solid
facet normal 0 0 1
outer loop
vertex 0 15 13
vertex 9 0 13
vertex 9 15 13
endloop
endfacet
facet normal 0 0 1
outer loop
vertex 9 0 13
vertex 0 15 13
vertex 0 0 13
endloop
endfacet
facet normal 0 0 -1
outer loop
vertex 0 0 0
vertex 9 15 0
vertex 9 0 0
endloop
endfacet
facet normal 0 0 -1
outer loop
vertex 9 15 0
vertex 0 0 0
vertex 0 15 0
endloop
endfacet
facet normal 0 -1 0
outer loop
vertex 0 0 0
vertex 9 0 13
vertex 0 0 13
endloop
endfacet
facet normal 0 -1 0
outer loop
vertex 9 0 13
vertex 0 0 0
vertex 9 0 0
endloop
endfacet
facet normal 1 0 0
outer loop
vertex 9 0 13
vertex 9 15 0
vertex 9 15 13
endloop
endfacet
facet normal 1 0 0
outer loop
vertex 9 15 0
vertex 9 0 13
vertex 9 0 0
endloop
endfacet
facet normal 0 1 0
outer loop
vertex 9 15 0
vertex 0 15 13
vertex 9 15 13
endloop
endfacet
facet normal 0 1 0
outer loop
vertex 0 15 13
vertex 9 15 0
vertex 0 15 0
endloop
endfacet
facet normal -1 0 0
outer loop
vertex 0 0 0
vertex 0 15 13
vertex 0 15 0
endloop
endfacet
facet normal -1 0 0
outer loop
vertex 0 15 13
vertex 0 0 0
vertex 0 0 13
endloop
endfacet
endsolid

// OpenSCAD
// Generated by SolidPython 1.0.1 on 2020-07-29 00:46:55


cube(size = [9, 15, 13]);
/***********************************************
*********      SolidPython code:      **********
************************************************
 
# import packages: SolidPython
from solid import *
from solid.utils import *
from itertools import chain, combinations, permutations


class Resize:

    def __init__(self, scad_file):
        self.scad_file = scad_file
        #self.scad_file = import_scad(scad_file)
        # cone/cylinder param:
        self.r1 = 0
        self.r2 = 0
        self.h = 0
        # rectangular prism param:
        self.w = 0
        self.l = 0
        # ellipse param:
        self.r = 0

    # import OpenScad code (file name corresponds to shape)


    # classify shape + parameters
    def assign(self, param1, param2, param3):
        if self.scad_file == 'cone.scad':
            self.r1 = param1
            self.r2 = param2
            self.h = param3
        elif self.scad_file == 'cylinder.scad':
            self.r1 = param1
            self.r2 = param2
            self.h = param3
        elif self.scad_file == 'rectangularPrism.scad':
            self.h = param1
            self.l = param2
            self.w = param3
        else:
            self.r = param1
            self.h = param2

    # resize parameters
    def iterate(self):
        x = range(3, 20, 2)
        i = 1
        if self.scad_file == 'cone.scad':
            tempList = list(permutations(x, 2))
            for temp in tempList:
                param1 = temp[0]
                param2 = temp[1]
                filepath = 'produced_scad_files/' + 'cone' + str(param1) + '_' + str(param2) + '_' + '.scad'
                scad_render_to_file(cylinder(h=param1, r1=param2, r2=0), filepath)

        elif self.scad_file == 'cylinder.scad':
            tempList = list(permutations(x, 3))
            for temp in tempList:
                param1 = temp[0]
                param2 = temp[1]
                filepath = 'produced_scad_files/' + 'cylinder' + str(param1) + '_' + str(param2) + '_' + '.scad'
                scad_render_to_file(cylinder(h=param1, r1=param2, r2=param2), filepath)

        elif self.scad_file == 'rectangularPrism.scad':
            tempList = list(permutations(x, 3))
            for temp in tempList:
                param1 = temp[0]
                param2 = temp[1]
                param3 = temp[2]
                filepath = 'produced_scad_files/' + 'rectangularPrism' + str(param1) + '_' + str(param2) + '_' + str(
                    param3) + '.scad'
                scad_render_to_file(cube(size=(param1, param2, param3)), filepath)

        elif self.scad_file == 'ellipse.scad':
            tempList = list(permutations(x, 4))
            for temp in tempList:
                param1 = temp[0]
                param2 = temp[1]
                param3 = temp[2]
                param4 = temp[3]
                filepath = 'produced_scad_files/' + 'ellipse' + str(param1) + '_' + str(param2) + '_' + str(param3) + '_' + str(param4) + '.scad'
                scad_render_to_file(scale([param1, param2, param3])(sphere(r=param4)), filepath)

    def render_to_scadfile(self):
        scad_render_to_file(scad, 'example.scad') 
 
************************************************/
